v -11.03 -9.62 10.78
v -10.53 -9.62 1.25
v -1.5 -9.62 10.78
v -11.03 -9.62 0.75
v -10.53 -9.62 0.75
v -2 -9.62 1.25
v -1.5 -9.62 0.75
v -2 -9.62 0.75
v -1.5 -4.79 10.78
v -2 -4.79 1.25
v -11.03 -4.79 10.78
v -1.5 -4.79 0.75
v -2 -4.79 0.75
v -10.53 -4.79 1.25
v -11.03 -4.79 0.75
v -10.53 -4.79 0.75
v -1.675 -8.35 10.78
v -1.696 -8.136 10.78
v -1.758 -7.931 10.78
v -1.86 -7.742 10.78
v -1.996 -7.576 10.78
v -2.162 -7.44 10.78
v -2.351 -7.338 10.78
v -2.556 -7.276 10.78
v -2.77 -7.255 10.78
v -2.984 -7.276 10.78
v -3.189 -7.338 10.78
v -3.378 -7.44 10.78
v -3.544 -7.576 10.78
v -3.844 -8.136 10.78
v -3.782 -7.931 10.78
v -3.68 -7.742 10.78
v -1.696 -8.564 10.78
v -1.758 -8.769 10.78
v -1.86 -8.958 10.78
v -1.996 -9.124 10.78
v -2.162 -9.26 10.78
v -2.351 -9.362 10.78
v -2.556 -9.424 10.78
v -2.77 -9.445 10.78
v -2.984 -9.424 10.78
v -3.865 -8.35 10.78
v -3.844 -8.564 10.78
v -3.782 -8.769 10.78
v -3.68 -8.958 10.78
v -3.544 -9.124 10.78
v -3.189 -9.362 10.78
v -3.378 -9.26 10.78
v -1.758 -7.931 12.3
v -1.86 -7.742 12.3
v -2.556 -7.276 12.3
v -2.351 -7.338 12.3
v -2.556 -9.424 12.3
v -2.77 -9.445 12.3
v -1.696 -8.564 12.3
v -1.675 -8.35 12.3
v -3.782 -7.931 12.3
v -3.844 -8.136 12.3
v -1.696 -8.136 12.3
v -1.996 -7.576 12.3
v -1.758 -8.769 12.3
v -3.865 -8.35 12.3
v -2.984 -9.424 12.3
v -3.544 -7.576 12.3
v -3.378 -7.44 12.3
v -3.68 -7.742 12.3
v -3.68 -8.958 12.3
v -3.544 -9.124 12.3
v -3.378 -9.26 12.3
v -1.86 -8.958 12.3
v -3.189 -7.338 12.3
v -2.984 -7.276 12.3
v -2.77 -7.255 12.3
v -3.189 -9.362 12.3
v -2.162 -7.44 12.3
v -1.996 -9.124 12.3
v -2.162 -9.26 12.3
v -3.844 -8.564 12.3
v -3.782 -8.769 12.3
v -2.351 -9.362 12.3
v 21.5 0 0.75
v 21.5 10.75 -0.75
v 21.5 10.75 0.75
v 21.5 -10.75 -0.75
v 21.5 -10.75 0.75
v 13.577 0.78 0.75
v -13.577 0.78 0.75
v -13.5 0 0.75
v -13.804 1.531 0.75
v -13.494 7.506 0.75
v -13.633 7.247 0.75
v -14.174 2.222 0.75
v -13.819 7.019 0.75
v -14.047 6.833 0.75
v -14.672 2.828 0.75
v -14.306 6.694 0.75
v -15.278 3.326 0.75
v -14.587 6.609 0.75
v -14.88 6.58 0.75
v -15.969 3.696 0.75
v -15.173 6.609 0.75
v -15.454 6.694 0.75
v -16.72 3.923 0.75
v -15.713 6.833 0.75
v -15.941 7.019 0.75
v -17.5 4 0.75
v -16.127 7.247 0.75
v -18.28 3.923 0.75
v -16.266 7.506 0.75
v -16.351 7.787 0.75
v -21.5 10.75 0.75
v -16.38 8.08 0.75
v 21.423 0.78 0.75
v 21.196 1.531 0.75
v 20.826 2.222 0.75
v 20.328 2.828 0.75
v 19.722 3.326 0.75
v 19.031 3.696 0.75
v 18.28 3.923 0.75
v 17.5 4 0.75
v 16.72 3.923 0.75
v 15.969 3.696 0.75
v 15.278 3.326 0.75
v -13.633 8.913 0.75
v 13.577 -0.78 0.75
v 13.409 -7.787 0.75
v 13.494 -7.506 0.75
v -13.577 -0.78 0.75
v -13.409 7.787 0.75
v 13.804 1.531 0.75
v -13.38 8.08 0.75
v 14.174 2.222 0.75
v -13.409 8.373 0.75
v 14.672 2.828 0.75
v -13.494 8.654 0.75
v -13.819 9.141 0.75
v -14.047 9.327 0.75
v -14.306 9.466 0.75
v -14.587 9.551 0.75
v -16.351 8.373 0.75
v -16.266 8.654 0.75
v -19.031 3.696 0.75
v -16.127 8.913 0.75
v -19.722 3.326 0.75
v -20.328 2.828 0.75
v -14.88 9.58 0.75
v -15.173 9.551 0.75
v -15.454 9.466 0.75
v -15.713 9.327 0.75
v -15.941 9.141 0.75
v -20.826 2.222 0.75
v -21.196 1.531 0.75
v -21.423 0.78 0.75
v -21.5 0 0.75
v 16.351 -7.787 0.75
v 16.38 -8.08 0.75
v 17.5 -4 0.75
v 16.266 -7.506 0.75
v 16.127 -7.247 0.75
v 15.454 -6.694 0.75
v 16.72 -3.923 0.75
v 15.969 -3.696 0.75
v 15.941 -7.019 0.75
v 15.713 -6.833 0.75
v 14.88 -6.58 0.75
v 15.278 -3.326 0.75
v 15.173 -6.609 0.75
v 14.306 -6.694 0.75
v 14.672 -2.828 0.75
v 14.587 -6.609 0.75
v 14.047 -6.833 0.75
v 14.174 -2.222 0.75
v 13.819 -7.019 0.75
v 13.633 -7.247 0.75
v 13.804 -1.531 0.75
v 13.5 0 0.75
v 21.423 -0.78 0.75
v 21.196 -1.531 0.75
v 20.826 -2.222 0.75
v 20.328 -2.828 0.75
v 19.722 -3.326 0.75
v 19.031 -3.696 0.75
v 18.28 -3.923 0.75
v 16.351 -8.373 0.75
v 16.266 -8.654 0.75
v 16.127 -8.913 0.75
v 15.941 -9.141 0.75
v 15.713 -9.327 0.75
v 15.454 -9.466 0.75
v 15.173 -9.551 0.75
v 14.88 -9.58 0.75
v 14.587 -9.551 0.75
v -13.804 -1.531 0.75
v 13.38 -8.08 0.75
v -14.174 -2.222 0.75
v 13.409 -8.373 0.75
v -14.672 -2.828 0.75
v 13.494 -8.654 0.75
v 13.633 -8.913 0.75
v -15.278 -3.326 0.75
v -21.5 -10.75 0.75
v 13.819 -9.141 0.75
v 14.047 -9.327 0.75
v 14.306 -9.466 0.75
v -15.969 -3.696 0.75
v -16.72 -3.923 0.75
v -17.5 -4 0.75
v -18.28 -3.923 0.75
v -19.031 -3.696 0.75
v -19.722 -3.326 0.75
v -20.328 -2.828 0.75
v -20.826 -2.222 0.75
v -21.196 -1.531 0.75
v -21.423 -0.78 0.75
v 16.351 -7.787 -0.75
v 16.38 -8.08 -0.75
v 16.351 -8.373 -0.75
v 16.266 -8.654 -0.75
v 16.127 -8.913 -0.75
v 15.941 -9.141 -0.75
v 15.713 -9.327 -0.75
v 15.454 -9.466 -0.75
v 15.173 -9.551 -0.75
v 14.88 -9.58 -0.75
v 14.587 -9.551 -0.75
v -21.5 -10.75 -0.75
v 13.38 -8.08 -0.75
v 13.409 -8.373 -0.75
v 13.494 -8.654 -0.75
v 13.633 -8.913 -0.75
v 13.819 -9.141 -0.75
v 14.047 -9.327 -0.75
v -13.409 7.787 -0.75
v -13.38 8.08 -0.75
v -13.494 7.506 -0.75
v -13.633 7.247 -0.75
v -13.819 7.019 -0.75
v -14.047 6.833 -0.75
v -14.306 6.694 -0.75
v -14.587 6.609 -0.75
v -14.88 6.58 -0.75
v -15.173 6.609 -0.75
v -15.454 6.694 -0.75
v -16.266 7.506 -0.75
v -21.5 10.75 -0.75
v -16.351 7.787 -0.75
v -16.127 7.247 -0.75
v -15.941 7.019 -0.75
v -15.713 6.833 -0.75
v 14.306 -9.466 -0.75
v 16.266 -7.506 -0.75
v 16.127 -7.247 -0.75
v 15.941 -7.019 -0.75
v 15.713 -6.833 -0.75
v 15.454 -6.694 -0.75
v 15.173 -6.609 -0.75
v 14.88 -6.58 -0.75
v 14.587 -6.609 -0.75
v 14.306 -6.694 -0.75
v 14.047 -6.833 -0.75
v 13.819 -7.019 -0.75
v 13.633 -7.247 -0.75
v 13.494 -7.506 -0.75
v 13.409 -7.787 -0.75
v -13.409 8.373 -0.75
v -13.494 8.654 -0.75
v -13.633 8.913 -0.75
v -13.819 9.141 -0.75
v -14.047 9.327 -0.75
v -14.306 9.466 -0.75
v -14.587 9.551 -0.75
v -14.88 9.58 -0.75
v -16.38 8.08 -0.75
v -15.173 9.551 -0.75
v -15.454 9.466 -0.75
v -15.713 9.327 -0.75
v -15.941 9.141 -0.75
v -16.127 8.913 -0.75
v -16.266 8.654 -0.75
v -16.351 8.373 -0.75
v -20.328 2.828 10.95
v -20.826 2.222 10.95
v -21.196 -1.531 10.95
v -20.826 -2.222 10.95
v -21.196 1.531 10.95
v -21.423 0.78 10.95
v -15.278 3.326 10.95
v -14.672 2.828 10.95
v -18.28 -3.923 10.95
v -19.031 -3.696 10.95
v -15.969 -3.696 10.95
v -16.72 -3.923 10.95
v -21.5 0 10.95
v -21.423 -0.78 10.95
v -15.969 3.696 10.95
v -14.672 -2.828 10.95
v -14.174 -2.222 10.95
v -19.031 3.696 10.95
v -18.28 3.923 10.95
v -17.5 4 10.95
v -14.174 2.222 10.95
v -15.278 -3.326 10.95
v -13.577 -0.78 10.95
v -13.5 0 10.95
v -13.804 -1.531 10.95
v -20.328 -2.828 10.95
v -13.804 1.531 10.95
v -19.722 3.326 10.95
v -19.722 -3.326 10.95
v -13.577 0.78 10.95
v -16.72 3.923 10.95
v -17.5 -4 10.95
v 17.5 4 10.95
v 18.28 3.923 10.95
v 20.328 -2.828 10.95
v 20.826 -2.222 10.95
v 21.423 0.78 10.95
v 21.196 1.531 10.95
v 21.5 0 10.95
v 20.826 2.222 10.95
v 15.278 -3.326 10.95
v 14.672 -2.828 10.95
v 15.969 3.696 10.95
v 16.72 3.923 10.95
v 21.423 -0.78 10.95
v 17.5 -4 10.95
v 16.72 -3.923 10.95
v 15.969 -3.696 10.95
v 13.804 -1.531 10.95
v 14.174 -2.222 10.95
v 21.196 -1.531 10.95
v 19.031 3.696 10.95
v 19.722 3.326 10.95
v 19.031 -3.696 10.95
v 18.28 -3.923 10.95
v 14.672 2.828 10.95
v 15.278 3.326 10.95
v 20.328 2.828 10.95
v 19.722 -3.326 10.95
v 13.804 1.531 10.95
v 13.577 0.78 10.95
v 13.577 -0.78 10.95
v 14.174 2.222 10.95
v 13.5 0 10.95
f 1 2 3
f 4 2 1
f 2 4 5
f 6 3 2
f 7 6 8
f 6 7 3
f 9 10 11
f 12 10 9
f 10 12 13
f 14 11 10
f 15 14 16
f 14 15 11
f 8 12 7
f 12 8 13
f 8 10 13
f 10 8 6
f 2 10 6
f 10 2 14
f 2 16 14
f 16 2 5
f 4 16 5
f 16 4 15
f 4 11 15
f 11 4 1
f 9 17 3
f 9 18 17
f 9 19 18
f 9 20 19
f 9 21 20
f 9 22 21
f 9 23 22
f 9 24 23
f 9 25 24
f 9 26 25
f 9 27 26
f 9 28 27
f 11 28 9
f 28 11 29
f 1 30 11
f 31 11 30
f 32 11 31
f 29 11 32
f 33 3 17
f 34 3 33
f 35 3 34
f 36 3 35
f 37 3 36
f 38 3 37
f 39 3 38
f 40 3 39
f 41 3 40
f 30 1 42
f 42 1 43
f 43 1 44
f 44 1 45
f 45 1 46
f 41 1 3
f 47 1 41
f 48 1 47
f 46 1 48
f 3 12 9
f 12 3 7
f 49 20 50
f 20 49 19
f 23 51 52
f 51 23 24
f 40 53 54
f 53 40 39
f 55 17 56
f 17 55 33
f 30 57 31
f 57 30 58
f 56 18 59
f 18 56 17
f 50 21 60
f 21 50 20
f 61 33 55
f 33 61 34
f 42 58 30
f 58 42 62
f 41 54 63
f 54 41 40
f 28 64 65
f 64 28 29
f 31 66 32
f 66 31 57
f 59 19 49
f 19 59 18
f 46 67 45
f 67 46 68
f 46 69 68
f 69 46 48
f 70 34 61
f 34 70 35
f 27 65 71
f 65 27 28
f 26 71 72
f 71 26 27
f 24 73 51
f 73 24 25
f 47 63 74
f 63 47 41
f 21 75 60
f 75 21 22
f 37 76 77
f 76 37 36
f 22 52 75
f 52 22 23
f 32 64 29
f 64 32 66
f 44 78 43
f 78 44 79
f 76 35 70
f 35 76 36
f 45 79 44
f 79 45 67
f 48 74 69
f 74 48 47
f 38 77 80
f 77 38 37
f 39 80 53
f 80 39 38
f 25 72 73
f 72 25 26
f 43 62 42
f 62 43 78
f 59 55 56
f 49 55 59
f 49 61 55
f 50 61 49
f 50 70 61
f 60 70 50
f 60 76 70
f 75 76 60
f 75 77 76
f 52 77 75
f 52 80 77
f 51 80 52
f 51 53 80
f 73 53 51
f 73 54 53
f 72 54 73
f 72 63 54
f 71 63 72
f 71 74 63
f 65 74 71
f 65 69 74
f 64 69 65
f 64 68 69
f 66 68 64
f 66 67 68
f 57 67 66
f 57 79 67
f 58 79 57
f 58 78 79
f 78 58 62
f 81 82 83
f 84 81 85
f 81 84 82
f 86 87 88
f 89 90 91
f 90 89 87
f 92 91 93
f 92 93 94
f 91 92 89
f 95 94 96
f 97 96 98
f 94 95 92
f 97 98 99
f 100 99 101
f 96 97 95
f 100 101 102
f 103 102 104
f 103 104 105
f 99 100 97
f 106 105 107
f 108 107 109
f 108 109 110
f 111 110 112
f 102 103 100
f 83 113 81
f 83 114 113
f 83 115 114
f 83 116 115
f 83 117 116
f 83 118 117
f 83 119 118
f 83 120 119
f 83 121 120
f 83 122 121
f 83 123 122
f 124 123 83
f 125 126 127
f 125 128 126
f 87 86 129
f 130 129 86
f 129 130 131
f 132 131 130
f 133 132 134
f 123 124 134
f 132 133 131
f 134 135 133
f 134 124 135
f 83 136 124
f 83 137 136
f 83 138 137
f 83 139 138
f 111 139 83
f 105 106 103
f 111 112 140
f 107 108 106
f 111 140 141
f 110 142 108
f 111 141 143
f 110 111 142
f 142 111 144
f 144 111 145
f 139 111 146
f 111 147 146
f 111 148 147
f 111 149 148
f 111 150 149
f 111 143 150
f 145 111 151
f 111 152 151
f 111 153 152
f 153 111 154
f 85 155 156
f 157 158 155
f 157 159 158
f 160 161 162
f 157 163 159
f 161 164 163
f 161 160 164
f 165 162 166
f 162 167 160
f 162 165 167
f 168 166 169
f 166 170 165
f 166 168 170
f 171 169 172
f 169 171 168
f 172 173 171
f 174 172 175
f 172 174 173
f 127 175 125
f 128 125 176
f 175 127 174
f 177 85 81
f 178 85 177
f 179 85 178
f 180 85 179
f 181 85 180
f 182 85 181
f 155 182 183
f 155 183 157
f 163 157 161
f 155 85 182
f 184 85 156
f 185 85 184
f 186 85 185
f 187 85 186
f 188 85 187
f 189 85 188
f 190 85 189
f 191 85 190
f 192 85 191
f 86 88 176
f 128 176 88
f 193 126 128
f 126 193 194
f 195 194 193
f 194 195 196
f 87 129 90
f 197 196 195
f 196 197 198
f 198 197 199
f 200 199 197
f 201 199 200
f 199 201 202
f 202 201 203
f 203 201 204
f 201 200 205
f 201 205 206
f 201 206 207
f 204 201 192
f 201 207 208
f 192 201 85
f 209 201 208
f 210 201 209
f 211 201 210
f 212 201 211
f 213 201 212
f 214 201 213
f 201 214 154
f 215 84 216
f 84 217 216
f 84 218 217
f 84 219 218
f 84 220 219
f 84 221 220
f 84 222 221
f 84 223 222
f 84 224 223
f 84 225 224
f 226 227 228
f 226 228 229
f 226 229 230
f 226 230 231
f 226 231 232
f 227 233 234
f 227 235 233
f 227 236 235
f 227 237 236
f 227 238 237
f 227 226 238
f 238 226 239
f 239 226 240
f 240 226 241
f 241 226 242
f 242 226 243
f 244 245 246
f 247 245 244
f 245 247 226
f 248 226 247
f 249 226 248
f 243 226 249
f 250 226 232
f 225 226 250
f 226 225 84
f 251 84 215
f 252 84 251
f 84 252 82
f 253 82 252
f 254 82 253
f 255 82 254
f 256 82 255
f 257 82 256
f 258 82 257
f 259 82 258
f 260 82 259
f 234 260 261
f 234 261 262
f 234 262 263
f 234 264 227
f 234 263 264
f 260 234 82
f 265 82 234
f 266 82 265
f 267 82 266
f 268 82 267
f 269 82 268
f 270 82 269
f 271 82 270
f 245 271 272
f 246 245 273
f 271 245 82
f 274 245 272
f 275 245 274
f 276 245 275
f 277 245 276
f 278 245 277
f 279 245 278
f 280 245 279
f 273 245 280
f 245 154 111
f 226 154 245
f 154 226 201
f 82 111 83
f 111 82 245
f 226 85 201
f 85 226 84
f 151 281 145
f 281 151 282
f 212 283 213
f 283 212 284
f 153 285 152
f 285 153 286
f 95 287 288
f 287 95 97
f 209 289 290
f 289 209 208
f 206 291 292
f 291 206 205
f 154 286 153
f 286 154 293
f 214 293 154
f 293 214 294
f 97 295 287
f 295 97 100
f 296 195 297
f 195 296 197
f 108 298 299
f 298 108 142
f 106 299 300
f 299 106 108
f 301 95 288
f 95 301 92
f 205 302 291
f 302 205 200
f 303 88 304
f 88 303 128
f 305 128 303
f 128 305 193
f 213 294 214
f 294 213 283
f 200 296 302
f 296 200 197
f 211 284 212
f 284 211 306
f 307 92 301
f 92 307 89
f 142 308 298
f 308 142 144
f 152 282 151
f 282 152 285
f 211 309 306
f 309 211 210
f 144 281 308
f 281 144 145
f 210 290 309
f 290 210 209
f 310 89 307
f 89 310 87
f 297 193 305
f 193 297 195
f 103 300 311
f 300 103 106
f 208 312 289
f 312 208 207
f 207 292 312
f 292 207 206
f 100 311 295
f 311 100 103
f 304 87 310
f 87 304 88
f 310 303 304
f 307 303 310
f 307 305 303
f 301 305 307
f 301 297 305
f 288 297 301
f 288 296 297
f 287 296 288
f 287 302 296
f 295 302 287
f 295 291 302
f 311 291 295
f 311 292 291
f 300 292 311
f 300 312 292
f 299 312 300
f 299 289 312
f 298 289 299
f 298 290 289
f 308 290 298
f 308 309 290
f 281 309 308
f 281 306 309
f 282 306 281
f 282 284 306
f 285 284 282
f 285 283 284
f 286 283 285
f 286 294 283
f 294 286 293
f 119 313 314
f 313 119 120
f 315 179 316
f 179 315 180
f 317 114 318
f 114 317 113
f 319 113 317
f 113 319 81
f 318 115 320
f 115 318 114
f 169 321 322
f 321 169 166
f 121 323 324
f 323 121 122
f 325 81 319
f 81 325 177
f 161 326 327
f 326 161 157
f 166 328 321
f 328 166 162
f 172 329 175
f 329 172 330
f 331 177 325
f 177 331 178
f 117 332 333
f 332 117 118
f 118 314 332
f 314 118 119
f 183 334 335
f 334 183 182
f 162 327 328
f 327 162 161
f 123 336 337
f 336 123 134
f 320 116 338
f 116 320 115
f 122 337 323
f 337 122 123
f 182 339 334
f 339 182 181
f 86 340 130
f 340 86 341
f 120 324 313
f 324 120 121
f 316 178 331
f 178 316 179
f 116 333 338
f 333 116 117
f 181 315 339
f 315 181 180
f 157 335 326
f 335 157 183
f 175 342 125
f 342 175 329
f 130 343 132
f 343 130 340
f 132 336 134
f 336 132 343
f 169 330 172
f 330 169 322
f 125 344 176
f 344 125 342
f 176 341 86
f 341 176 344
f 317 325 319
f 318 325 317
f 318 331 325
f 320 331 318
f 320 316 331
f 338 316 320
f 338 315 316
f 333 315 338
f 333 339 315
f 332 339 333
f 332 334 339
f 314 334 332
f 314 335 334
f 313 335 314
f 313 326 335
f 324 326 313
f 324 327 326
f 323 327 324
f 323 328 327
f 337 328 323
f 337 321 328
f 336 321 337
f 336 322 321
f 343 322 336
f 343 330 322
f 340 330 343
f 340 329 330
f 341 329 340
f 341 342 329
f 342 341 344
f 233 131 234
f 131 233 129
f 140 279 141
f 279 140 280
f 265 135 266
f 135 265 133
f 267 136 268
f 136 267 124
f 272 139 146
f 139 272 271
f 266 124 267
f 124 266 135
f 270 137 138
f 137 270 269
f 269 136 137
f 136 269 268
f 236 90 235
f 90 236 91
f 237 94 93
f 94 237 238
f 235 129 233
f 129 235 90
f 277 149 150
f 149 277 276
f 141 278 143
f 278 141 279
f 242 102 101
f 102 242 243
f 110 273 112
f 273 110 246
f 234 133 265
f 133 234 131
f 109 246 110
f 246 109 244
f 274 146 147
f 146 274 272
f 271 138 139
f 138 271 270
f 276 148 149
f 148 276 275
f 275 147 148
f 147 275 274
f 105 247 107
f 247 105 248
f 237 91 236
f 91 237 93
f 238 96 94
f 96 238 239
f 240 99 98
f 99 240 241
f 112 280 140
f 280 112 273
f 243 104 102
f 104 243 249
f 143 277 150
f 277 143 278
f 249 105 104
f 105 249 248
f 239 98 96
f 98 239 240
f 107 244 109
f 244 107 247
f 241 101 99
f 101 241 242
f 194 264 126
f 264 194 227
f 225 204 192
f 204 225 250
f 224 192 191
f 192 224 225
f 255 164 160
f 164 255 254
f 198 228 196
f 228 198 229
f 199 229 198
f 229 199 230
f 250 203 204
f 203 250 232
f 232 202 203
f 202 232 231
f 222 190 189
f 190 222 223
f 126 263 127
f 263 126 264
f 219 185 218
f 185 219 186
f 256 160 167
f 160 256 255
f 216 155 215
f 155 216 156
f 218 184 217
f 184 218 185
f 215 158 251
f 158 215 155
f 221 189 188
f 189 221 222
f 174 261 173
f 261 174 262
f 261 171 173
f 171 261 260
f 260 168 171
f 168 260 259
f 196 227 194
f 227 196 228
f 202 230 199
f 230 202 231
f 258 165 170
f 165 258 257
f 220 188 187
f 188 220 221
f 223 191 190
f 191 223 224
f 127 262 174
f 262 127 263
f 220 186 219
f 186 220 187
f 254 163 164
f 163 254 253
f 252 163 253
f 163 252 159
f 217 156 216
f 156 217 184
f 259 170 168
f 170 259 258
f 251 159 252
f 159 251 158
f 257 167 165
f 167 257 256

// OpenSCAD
// Start: lazy_union
default_5_default_5();
// End: lazy_union

// Modules.

// 'PartMaterial undef-default - default 5.0'
module default_5_default_5() {
  // 'None : _combine_solids_and_holes'
  union() {
    // '_combine_solids_and_holes'
    difference() {
      // 'default : _combine_solids_and_holes'
      union() {
        // 'pcb'
        multmatrix(m=[[1.0, 0.0, 0.0, -21.5], [0.0, 1.0, 0.0, -10.75], [0.0, 0.0, 1.0, -0.75], [0.0, 0.0, 0.0, 1.0]]) {
          // 'pcb : _combine_solids_and_holes'
          union() {
            // 'pcb'
            cube(size=[43.0, 21.5, 1.5]);
          }
        }
        // 'cap_in'
        multmatrix(m=[[-1.0, 0.0, 0.0, -17.5], [0.0, -1.0, 0.0, 0.0], [0.0, 0.0, 1.0, 0.75], [0.0, 0.0, 0.0, 1.0]]) {
          // 'cap_in : _combine_solids_and_holes'
          union() {
            // 'cap_in'
            cylinder(h=10.2, r1=4.0, r2=4.0, center=false, $fn=32);
          }
        }
        // 'cap_out'
        multmatrix(m=[[1.0, 0.0, 0.0, 17.5], [0.0, 1.0, 0.0, 0.0], [0.0, 0.0, 1.0, 0.75], [0.0, 0.0, 0.0, 1.0]]) {
          // 'cap_out : _combine_solids_and_holes'
          union() {
            // 'cap_out'
            cylinder(h=10.2, r1=4.0, r2=4.0, center=false, $fn=32);
          }
        }
        // 'trimpot'
        multmatrix(m=[[-1.0, 0.0, 0.0, -1.5], [0.0, -1.0, 0.0, -9.620000000000001], [0.0, 0.0, 1.0, 0.75], [0.0, 0.0, 0.0, 1.0]]) {
          // 'trimpot : _combine_solids_and_holes'
          union() {
            // 'trimpot'
            multmatrix(m=[[-1.0, -0.0, -0.0, 9.53], [-0.0, -0.0, -1.0, -0.0], [-0.0, -1.0, -0.0, 10.03], [0.0, 0.0, 0.0, 1.0]]) {
              // 'trimpot : _combine_solids_and_holes'
              union() {
                // 'trimpot'
                linear_extrude(height=4.83, twist=0.0, slices=4, scale=[1.0, 1.0], $fn=32) {
                  polygon(points=[[0.0, 0.0], [9.53, 0.0], [9.53, 10.03], [9.03, 10.03], [9.03, 9.53], [0.5, 9.53], [0.5, 10.03], [0.0, 10.03]]);
                }
              }
            }
            // 'adj'
            multmatrix(m=[[-1.0, 0.0, 0.0, 1.27], [0.0, -1.0, 0.0, -1.27], [0.0, 0.0, 1.0, 10.03], [0.0, 0.0, 0.0, 1.0]]) {
              // 'adj : _combine_solids_and_holes'
              union() {
                // 'adj'
                cylinder(h=1.52, r1=1.095, r2=1.095, center=false, $fn=32);
              }
            }
          }
        }
      }
      // 'default'
      multmatrix(m=[[0.0, 1.0, 0.0, -14.88], [1.0, 0.0, 0.0, 8.08], [0.0, 0.0, -1.0, 0.76], [0.0, 0.0, 0.0, 1.0]]) {
        // "('mount_hole', 0) : _combine_solids_and_holes"
        union() {
          // ('mount_hole', 0)
          cylinder(h=1.52, r1=1.5, r2=1.5, center=false, $fn=32);
        }
      }
      // 'default'
      multmatrix(m=[[0.0, -1.0, 0.0, 14.88], [-1.0, 0.0, 0.0, -8.08], [0.0, 0.0, -1.0, 0.76], [0.0, 0.0, 0.0, 1.0]]) {
        // "('mount_hole', 1) : _combine_solids_and_holes"
        union() {
          // ('mount_hole', 1)
          cylinder(h=1.52, r1=1.5, r2=1.5, center=false, $fn=32);
        }
      }
    }
  }
} // end module default_5_default_5
